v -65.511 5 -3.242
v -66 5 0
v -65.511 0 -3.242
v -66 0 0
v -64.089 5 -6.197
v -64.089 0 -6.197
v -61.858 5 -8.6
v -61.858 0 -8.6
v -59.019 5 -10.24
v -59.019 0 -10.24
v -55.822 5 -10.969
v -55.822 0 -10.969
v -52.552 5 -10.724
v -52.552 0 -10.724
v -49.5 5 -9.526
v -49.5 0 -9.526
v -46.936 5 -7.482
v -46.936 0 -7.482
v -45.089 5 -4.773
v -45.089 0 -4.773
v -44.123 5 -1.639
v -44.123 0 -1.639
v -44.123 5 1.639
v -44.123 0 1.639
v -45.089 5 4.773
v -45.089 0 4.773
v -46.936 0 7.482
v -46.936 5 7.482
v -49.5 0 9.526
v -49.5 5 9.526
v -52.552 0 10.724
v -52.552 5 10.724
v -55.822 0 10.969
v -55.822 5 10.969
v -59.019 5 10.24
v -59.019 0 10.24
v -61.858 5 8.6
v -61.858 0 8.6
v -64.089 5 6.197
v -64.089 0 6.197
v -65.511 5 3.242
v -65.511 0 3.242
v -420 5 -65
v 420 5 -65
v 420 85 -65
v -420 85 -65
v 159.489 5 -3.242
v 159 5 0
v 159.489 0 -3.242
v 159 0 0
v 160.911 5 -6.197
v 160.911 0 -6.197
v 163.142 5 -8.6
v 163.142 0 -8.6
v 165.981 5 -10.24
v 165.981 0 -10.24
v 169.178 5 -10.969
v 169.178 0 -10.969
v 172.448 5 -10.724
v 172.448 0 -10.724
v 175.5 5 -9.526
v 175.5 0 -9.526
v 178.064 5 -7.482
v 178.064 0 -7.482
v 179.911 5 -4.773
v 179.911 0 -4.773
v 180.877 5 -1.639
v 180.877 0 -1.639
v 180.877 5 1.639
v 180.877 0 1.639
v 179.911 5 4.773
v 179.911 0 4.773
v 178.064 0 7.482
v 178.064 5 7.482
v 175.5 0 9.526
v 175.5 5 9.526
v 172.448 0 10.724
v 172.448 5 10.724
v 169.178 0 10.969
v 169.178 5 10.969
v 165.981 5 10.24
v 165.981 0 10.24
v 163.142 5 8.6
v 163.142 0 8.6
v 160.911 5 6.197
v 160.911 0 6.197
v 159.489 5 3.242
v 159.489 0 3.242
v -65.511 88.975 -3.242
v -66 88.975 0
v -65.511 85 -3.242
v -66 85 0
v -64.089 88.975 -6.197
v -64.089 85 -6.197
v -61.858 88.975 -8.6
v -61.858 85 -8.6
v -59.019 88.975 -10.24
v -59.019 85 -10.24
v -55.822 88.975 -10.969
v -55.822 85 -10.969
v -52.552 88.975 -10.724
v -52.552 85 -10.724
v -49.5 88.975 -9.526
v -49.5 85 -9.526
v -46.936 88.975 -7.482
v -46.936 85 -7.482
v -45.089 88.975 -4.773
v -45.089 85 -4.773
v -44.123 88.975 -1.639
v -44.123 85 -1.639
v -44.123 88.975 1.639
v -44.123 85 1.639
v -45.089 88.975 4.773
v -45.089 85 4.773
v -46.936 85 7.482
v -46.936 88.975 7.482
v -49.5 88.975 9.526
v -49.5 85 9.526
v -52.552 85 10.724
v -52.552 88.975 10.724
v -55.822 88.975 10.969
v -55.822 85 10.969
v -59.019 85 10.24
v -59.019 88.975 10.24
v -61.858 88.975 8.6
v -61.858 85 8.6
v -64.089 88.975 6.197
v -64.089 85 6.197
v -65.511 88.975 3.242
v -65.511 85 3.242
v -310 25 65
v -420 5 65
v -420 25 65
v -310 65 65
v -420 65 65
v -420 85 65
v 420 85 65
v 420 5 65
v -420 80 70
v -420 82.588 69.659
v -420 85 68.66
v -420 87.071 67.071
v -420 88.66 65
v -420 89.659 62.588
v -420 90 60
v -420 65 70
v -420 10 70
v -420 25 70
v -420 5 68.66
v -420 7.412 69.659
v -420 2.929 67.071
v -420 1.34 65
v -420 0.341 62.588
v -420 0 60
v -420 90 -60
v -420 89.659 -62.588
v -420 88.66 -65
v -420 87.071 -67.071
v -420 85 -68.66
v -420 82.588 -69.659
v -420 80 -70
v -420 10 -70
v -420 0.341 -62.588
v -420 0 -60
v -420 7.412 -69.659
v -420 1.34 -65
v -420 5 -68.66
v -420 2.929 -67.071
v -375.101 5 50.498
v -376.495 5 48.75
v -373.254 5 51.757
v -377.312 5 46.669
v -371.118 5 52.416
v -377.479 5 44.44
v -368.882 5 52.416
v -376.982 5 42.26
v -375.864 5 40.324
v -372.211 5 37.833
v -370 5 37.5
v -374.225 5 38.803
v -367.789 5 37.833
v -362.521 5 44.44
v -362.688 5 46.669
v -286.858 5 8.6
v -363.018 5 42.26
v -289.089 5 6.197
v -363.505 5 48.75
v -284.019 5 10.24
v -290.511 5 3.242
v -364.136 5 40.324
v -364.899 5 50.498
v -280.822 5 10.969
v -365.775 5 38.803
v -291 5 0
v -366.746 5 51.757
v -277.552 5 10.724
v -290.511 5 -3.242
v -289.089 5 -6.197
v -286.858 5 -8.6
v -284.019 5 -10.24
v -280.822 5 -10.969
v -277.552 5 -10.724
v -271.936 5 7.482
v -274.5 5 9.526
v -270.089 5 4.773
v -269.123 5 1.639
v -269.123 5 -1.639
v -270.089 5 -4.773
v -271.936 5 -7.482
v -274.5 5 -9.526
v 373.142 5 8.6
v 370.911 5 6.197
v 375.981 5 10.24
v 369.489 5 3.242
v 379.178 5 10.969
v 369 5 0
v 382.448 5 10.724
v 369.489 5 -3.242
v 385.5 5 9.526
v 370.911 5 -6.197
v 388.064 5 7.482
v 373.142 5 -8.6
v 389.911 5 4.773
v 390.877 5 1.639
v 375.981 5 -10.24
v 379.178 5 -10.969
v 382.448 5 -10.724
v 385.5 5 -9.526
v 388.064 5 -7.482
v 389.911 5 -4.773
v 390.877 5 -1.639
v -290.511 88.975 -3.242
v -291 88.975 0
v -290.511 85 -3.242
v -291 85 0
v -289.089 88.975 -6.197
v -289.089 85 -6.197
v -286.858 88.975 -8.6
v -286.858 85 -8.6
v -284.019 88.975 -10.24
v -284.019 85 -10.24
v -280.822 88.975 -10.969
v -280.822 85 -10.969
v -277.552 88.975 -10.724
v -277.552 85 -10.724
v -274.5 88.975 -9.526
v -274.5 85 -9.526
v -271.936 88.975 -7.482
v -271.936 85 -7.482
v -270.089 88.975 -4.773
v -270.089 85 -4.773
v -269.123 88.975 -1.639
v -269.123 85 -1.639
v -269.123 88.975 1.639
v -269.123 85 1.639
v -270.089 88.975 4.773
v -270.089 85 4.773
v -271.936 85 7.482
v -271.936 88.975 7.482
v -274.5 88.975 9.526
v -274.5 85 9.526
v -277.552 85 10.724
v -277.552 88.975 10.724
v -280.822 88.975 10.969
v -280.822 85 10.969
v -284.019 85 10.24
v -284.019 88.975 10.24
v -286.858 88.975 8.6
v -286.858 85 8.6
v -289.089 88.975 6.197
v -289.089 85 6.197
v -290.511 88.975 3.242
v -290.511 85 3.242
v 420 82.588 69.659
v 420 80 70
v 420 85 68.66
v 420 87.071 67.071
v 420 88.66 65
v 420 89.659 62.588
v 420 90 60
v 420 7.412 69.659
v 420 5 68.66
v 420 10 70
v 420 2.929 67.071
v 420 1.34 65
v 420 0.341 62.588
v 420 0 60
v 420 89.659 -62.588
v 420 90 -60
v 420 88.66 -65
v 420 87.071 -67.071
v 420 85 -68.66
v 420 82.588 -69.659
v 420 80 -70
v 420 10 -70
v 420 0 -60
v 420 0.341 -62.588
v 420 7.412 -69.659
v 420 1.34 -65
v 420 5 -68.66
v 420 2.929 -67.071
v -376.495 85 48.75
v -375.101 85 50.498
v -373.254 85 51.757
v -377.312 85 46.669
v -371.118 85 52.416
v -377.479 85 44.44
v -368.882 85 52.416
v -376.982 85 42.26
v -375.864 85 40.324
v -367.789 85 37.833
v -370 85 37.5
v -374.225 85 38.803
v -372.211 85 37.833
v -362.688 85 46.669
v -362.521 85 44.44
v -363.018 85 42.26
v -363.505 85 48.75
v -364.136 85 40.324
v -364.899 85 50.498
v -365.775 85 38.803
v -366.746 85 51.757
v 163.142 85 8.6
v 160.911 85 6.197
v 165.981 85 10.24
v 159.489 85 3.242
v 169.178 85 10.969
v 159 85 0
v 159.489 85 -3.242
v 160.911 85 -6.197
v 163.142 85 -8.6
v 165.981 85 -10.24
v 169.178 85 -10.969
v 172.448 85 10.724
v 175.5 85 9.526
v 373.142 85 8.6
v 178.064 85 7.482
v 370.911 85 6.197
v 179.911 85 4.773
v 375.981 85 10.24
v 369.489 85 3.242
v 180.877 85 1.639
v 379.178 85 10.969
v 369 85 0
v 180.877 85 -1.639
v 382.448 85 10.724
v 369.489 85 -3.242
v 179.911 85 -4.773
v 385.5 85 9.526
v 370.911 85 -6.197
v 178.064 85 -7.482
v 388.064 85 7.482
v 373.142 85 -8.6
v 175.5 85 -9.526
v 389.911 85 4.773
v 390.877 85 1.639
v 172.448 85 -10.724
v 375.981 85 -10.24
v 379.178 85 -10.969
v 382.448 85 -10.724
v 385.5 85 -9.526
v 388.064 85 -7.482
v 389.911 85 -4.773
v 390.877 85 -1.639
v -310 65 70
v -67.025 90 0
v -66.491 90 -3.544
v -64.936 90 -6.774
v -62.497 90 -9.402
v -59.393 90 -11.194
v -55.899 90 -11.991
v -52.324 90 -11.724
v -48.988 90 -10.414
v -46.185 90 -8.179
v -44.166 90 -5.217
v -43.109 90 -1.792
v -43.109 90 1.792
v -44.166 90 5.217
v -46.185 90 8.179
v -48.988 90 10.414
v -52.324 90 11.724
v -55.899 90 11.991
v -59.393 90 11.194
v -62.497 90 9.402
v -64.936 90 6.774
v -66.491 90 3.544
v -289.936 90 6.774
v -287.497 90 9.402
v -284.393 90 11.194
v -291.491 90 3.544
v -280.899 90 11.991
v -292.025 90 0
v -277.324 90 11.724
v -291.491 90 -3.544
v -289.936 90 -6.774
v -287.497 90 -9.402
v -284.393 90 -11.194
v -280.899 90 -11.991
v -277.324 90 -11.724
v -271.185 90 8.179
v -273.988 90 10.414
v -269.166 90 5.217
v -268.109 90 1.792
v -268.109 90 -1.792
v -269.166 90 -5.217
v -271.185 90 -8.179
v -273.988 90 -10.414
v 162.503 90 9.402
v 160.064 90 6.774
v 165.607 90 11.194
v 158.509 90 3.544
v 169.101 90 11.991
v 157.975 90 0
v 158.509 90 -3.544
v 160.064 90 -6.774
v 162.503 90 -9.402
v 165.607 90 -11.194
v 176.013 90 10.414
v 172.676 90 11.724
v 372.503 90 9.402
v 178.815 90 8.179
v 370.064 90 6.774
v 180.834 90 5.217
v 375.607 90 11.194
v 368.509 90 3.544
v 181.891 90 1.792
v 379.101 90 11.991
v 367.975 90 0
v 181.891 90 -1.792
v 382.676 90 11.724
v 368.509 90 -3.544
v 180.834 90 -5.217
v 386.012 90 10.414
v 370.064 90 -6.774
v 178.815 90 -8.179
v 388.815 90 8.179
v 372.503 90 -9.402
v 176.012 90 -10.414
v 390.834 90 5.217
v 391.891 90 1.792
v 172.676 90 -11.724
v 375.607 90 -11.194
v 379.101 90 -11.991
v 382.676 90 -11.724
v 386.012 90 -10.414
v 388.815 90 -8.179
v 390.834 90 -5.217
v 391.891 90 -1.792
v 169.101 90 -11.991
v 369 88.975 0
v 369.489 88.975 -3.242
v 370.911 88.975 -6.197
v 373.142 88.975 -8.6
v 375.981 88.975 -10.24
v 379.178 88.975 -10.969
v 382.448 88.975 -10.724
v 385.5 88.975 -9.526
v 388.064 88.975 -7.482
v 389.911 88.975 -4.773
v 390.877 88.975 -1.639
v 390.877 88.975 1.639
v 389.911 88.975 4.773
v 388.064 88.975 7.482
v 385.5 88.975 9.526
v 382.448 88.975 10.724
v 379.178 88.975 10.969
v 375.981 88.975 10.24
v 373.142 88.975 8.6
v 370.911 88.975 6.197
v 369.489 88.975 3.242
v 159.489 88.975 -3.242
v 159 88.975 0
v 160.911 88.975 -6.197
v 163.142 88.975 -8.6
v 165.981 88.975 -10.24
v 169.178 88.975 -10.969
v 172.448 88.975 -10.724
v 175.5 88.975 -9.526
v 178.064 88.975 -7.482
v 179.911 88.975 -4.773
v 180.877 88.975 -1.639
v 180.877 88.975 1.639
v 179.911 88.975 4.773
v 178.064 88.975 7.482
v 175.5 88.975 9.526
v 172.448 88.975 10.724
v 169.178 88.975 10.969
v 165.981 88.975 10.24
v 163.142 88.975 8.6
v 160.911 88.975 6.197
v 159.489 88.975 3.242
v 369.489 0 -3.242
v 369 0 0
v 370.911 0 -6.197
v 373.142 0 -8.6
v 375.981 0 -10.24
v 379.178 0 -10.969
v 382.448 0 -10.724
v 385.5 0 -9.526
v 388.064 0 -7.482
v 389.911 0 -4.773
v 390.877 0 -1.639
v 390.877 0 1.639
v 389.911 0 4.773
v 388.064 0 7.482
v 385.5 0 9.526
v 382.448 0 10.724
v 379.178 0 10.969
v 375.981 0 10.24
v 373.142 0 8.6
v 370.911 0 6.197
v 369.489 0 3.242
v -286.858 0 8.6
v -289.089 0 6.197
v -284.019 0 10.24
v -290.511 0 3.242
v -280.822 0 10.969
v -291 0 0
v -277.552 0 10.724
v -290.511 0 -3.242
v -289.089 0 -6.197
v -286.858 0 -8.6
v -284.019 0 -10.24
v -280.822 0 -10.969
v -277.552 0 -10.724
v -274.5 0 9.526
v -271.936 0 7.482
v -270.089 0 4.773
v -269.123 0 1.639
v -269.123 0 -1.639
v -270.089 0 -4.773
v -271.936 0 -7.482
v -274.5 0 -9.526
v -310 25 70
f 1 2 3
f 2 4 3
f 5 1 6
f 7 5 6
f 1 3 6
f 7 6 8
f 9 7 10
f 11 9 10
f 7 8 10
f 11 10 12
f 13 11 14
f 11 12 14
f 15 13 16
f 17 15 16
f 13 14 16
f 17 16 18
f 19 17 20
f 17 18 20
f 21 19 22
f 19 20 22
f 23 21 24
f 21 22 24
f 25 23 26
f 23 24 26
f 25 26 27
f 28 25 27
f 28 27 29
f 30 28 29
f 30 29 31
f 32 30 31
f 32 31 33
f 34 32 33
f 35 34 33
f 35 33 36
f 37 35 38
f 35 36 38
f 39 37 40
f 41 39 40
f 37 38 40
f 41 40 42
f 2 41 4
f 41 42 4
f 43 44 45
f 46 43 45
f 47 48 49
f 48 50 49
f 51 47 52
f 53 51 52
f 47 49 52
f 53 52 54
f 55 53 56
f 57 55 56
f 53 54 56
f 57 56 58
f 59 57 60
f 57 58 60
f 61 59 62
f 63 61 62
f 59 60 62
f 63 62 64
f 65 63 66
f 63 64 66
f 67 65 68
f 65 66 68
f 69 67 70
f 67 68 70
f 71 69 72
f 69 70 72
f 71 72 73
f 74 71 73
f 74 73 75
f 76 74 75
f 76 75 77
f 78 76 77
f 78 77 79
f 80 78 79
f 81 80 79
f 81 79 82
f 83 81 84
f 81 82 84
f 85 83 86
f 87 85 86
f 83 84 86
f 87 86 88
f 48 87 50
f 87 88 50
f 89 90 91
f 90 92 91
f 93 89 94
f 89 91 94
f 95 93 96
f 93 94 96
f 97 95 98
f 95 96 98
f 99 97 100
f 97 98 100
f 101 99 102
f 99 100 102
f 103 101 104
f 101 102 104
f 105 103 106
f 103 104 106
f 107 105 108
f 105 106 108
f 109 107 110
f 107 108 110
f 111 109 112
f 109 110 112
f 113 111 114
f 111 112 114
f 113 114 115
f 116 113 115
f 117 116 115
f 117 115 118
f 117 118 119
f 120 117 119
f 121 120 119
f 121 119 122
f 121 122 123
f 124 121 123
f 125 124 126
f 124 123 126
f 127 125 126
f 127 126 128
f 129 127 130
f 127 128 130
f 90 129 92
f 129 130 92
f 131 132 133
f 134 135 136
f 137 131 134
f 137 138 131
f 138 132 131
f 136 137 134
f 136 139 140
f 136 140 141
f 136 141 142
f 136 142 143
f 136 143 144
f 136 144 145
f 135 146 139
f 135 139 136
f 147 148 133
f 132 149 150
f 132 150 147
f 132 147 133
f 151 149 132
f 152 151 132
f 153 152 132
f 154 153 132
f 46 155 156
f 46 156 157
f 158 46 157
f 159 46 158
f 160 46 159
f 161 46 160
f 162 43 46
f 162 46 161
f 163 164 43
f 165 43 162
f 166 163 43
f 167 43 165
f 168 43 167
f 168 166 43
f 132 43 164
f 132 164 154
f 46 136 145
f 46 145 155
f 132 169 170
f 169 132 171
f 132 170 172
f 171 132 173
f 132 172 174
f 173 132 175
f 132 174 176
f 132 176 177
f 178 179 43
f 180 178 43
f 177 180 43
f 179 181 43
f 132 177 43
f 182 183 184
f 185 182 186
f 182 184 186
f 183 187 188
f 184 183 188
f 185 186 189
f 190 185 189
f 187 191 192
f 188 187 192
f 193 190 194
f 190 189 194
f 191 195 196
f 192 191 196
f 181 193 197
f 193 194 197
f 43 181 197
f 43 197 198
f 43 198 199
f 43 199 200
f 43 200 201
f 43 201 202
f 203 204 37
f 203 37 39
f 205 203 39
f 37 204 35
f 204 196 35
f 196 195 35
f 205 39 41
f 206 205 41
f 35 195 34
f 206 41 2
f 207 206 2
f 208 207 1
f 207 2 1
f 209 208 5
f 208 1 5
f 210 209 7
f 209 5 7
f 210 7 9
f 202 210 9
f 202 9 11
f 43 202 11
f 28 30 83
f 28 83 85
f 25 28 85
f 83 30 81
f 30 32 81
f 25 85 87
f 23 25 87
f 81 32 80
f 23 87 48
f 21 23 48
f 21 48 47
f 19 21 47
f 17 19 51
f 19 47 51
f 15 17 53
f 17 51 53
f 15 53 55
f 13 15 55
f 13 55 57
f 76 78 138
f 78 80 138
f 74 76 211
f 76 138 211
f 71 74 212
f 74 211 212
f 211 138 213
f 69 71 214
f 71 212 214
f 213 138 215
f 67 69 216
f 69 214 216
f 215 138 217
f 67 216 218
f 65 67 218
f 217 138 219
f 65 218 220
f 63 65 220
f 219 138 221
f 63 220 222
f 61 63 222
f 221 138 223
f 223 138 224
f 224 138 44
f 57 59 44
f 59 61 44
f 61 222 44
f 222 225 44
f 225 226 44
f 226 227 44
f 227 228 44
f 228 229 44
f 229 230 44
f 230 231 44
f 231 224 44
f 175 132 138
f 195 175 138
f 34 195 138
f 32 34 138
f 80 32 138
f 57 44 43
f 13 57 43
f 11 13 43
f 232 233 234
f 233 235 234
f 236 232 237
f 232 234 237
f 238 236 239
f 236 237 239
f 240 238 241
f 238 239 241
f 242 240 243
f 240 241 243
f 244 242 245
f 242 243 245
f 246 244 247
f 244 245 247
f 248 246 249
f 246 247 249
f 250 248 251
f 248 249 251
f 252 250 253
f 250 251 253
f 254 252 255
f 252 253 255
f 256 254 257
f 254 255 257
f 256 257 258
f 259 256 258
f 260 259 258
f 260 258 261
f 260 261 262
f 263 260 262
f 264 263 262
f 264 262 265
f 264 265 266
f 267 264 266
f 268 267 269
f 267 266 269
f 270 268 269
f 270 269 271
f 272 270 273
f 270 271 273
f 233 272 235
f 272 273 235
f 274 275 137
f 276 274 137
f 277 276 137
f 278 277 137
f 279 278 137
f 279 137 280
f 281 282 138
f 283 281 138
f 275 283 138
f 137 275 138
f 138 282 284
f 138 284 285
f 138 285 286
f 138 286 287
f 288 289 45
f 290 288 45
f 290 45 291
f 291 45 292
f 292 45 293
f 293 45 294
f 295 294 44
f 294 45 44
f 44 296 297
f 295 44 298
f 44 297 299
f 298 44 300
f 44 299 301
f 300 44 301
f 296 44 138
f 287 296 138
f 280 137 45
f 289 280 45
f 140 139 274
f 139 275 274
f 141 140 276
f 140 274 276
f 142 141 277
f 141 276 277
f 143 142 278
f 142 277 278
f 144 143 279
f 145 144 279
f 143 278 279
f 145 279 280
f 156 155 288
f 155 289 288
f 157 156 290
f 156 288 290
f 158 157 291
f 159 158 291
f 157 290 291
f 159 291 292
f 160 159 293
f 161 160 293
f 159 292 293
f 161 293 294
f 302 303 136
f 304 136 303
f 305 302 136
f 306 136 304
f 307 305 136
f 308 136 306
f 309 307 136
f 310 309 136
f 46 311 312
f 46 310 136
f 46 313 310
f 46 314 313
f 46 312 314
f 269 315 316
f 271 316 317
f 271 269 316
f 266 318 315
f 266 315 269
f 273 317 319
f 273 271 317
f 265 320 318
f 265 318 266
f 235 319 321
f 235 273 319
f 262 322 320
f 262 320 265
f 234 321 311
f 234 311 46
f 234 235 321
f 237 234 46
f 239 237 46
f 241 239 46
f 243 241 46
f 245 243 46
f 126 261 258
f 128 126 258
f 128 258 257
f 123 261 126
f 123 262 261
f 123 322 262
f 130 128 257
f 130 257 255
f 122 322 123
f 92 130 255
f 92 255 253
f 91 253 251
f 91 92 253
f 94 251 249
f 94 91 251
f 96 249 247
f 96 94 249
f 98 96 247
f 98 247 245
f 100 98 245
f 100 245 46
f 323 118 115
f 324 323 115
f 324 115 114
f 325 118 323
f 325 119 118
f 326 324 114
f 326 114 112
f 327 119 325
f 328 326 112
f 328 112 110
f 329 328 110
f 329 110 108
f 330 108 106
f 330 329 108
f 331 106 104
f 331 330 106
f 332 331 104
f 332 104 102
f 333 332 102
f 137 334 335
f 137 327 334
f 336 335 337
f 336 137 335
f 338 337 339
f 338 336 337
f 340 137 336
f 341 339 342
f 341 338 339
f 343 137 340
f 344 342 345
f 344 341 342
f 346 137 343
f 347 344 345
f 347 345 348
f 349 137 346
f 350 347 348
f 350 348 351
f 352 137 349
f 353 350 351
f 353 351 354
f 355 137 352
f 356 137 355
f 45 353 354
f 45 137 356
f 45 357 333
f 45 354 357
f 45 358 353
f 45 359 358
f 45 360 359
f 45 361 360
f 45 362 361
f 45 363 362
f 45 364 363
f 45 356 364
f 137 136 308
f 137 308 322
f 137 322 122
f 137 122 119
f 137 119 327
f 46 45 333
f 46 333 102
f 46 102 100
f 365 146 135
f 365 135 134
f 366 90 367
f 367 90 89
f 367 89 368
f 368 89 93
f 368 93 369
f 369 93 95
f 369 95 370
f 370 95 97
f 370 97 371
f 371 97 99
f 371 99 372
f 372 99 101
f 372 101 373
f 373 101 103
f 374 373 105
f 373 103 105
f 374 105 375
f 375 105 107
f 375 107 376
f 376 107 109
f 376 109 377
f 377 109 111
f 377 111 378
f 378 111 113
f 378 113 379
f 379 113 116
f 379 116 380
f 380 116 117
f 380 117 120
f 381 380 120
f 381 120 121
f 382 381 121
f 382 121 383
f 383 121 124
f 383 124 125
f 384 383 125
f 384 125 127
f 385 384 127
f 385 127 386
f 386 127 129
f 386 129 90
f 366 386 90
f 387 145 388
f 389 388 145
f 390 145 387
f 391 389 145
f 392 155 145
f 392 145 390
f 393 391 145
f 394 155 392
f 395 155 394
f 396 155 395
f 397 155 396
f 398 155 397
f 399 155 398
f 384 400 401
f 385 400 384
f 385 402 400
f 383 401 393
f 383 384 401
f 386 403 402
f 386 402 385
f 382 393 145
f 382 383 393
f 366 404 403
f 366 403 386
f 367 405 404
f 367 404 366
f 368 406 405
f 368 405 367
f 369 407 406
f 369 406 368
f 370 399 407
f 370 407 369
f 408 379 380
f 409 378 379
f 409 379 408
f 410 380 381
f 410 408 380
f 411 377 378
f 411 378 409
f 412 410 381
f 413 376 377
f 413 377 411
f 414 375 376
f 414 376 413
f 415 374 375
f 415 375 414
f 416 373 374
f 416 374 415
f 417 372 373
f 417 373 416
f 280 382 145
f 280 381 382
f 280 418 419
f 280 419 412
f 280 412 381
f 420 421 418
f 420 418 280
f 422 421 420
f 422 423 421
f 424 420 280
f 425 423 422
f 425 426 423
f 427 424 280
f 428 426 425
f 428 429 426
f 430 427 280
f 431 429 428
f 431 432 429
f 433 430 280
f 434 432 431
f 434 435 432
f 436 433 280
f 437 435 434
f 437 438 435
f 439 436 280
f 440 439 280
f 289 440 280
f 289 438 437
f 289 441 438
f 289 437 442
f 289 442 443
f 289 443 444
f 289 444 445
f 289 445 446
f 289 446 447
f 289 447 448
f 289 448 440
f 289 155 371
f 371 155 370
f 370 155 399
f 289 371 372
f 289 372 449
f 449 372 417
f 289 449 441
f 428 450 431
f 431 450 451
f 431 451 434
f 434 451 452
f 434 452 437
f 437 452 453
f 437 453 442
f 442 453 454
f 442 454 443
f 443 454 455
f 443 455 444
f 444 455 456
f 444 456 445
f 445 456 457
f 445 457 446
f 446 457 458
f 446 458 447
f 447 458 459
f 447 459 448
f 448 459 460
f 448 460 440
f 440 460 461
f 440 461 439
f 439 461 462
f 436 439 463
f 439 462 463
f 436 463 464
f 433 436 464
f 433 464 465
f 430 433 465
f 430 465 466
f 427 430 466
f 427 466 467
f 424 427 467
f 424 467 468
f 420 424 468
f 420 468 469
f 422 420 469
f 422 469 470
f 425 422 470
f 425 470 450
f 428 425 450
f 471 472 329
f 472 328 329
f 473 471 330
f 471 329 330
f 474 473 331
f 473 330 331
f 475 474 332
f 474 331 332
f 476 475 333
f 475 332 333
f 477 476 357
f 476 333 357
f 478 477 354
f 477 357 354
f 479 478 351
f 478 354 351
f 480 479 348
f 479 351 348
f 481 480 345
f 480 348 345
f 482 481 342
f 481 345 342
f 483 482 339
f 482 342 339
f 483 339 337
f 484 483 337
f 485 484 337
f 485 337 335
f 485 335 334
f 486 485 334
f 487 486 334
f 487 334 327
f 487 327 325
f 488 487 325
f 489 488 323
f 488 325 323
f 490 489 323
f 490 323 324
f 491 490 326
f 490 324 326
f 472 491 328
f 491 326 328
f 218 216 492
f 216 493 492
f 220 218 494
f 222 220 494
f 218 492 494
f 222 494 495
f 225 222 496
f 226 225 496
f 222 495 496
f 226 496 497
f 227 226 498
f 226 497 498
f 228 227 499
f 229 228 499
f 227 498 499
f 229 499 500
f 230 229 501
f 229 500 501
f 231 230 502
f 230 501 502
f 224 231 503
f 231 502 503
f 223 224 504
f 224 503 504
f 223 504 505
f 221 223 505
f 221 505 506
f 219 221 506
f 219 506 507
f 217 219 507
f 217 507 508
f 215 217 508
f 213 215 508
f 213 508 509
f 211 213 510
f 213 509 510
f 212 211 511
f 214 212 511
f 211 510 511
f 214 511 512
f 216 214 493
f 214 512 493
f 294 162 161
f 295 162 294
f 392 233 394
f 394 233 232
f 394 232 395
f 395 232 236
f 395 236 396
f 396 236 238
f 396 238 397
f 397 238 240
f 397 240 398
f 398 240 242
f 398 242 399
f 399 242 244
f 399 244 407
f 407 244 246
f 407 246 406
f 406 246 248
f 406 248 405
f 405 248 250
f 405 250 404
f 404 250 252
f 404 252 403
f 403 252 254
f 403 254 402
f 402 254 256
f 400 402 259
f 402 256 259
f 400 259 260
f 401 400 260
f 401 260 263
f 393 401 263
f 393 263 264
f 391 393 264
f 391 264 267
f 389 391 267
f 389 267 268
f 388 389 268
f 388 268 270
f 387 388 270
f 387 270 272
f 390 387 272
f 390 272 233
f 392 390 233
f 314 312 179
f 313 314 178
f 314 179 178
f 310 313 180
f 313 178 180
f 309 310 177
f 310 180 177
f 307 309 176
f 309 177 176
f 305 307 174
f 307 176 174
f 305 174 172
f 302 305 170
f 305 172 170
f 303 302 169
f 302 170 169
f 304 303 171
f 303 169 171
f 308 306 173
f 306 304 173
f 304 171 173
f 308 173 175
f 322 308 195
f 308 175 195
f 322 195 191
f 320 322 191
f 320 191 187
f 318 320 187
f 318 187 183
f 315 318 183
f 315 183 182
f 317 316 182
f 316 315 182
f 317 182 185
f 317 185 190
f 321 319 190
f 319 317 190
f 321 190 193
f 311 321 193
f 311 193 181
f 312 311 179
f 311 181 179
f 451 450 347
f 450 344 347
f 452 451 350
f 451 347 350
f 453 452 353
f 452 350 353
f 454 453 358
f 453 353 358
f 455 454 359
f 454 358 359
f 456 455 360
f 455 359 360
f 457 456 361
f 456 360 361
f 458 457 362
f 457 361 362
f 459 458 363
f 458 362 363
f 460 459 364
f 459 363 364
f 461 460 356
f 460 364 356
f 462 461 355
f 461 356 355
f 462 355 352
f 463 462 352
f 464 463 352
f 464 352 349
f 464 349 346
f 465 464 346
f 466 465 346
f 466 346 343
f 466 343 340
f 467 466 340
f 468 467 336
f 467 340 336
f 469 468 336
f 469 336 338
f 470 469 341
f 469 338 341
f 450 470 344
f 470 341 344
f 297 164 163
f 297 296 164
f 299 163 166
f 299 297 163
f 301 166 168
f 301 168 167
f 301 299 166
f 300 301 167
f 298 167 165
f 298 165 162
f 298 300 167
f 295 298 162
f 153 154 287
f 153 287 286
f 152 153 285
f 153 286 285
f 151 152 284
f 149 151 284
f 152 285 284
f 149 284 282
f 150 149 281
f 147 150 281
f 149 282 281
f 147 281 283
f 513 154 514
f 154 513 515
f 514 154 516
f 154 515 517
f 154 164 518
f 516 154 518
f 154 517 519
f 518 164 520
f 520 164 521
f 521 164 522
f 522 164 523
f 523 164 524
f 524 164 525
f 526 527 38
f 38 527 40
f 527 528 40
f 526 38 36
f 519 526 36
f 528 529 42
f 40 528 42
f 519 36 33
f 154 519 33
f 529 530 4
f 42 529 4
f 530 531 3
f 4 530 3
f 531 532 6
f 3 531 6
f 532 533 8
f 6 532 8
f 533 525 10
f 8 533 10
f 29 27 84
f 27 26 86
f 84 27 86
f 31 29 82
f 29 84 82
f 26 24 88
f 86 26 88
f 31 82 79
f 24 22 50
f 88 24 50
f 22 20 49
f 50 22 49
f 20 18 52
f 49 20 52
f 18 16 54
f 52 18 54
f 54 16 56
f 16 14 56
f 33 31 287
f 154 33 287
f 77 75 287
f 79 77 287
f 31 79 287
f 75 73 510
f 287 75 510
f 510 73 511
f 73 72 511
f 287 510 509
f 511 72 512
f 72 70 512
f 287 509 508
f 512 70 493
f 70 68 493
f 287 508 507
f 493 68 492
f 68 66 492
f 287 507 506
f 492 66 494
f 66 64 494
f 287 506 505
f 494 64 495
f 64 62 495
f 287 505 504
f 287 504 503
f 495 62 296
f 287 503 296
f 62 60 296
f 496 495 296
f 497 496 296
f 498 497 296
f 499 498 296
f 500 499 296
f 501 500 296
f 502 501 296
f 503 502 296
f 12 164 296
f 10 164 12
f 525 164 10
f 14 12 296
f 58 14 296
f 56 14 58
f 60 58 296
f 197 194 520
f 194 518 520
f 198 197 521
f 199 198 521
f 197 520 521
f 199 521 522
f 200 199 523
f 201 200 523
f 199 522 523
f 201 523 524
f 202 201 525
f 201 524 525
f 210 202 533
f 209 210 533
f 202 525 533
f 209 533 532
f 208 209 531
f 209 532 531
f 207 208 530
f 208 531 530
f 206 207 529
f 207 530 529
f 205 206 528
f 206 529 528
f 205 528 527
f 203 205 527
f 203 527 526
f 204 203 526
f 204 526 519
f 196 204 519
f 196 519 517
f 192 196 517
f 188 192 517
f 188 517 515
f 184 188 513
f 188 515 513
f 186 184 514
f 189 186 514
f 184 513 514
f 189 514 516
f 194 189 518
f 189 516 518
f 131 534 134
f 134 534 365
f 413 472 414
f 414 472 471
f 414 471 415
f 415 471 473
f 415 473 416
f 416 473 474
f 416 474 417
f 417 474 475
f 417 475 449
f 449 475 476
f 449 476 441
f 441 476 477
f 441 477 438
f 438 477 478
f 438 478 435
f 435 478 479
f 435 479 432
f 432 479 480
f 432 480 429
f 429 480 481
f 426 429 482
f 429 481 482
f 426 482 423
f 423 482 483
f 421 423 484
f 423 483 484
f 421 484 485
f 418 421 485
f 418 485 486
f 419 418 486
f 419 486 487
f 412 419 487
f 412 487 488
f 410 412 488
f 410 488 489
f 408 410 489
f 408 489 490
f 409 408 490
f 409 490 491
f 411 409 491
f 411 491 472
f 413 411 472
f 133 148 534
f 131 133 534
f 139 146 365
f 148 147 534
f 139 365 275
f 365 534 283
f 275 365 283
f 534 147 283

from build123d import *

# Parameters (mm, degrees)
SKETCH1_W                        = 840
SKETCH1_H                        = 140
BOSS_EXTRUDE1_DEPTH              = 90
SKETCH2_W                        = 130
SKETCH2_H                        = 80
CUT_EXTRUDE1_DEPTH               = 848.702778101
FILLET2_R                        = 10
FILLET4_R                        = 10
M24X2_0_TAPPED_HOLE1_D           = 22
M24X2_0_TAPPED_HOLE1_CSINK_D     = 24.05
M24X2_0_TAPPED_HOLE1_CSINK_ANGLE = 90
CUT_EXTRUDE2_REACH               = 453.774
SKETCH7_W                        = 127
SKETCH7_H                        = 40
BOSS_EXTRUDE2_REACH              = 436.195
SKETCH8_R                        = 7.5


with BuildPart() as part:
    # Sketch1 → Boss-Extrude1 (new body)
    with BuildSketch(Plane(origin=(0, 0, 0), x_dir=(1, 0, 0), z_dir=(0, 1, 0))):
        Rectangle(SKETCH1_W, SKETCH1_H)
    extrude(amount=BOSS_EXTRUDE1_DEPTH)

    # Sketch2 → Cut-Extrude1 (cut, through all)
    with BuildSketch(Plane(origin=(420, 0, 0), x_dir=(0, 0, -1), z_dir=(1, 0, 0))):
        with Locations((0, 45)):
            Rectangle(SKETCH2_W, SKETCH2_H)
    extrude(amount=-CUT_EXTRUDE1_DEPTH, mode=Mode.SUBTRACT)

    # Fillet2
    fillet2_edges = [part.edges().sort_by_distance(p)[0] for p in [
        (0, 0, -70),
        (0, 90, -70),
    ]]
    fillet(fillet2_edges, radius=FILLET2_R)

    # Fillet4
    fillet4_edges = [part.edges().sort_by_distance(p)[0] for p in [
        (0, 90, 70),
        (0, 0, 70),
    ]]
    fillet(fillet4_edges, radius=FILLET4_R)

    # M24x2.0 Tapped Hole1 (through all)
    with Locations(Plane(origin=(0, 90, 0), x_dir=(1, 0, 0), z_dir=(0, 1, 0))):
        with Locations((-55, 0), (170, 0), (-280, 0), (380, 0)):
            CounterSinkHole(M24X2_0_TAPPED_HOLE1_D / 2, M24X2_0_TAPPED_HOLE1_CSINK_D / 2, counter_sink_angle=M24X2_0_TAPPED_HOLE1_CSINK_ANGLE)

    # Sketch7 → Cut-Extrude2 (cut, up to next)
    with BuildSketch(Plane.XY.offset(70), mode=Mode.PRIVATE) as cut_extrude2_sk1:
        with Locations((-373.5, 45)):
            Rectangle(SKETCH7_W, SKETCH7_H)
    cut_extrude2_tool1 = extrude(cut_extrude2_sk1.sketch, amount=-CUT_EXTRUDE2_REACH, mode=Mode.PRIVATE) & part.part
    add(cut_extrude2_tool1.solids().sort_by_distance((-373.5, 45, 70))[0], mode=Mode.SUBTRACT)

    # Sketch8 → Boss-Extrude2 (add, up to next)
    with BuildSketch(Plane(origin=(0, 5, 0), x_dir=(1, 0, 0), z_dir=(0, 1, 0)), mode=Mode.PRIVATE) as boss_extrude2_sk1:
        with Locations(Location((-370, -45, 0), (0, 0, 90))):
            Circle(SKETCH8_R)
    boss_extrude2_tool1 = extrude(boss_extrude2_sk1.sketch, amount=BOSS_EXTRUDE2_REACH, mode=Mode.PRIVATE) - part.part
    add(boss_extrude2_tool1.solids().sort_by_distance((-370, 5, 45))[0])


solid = part.part
